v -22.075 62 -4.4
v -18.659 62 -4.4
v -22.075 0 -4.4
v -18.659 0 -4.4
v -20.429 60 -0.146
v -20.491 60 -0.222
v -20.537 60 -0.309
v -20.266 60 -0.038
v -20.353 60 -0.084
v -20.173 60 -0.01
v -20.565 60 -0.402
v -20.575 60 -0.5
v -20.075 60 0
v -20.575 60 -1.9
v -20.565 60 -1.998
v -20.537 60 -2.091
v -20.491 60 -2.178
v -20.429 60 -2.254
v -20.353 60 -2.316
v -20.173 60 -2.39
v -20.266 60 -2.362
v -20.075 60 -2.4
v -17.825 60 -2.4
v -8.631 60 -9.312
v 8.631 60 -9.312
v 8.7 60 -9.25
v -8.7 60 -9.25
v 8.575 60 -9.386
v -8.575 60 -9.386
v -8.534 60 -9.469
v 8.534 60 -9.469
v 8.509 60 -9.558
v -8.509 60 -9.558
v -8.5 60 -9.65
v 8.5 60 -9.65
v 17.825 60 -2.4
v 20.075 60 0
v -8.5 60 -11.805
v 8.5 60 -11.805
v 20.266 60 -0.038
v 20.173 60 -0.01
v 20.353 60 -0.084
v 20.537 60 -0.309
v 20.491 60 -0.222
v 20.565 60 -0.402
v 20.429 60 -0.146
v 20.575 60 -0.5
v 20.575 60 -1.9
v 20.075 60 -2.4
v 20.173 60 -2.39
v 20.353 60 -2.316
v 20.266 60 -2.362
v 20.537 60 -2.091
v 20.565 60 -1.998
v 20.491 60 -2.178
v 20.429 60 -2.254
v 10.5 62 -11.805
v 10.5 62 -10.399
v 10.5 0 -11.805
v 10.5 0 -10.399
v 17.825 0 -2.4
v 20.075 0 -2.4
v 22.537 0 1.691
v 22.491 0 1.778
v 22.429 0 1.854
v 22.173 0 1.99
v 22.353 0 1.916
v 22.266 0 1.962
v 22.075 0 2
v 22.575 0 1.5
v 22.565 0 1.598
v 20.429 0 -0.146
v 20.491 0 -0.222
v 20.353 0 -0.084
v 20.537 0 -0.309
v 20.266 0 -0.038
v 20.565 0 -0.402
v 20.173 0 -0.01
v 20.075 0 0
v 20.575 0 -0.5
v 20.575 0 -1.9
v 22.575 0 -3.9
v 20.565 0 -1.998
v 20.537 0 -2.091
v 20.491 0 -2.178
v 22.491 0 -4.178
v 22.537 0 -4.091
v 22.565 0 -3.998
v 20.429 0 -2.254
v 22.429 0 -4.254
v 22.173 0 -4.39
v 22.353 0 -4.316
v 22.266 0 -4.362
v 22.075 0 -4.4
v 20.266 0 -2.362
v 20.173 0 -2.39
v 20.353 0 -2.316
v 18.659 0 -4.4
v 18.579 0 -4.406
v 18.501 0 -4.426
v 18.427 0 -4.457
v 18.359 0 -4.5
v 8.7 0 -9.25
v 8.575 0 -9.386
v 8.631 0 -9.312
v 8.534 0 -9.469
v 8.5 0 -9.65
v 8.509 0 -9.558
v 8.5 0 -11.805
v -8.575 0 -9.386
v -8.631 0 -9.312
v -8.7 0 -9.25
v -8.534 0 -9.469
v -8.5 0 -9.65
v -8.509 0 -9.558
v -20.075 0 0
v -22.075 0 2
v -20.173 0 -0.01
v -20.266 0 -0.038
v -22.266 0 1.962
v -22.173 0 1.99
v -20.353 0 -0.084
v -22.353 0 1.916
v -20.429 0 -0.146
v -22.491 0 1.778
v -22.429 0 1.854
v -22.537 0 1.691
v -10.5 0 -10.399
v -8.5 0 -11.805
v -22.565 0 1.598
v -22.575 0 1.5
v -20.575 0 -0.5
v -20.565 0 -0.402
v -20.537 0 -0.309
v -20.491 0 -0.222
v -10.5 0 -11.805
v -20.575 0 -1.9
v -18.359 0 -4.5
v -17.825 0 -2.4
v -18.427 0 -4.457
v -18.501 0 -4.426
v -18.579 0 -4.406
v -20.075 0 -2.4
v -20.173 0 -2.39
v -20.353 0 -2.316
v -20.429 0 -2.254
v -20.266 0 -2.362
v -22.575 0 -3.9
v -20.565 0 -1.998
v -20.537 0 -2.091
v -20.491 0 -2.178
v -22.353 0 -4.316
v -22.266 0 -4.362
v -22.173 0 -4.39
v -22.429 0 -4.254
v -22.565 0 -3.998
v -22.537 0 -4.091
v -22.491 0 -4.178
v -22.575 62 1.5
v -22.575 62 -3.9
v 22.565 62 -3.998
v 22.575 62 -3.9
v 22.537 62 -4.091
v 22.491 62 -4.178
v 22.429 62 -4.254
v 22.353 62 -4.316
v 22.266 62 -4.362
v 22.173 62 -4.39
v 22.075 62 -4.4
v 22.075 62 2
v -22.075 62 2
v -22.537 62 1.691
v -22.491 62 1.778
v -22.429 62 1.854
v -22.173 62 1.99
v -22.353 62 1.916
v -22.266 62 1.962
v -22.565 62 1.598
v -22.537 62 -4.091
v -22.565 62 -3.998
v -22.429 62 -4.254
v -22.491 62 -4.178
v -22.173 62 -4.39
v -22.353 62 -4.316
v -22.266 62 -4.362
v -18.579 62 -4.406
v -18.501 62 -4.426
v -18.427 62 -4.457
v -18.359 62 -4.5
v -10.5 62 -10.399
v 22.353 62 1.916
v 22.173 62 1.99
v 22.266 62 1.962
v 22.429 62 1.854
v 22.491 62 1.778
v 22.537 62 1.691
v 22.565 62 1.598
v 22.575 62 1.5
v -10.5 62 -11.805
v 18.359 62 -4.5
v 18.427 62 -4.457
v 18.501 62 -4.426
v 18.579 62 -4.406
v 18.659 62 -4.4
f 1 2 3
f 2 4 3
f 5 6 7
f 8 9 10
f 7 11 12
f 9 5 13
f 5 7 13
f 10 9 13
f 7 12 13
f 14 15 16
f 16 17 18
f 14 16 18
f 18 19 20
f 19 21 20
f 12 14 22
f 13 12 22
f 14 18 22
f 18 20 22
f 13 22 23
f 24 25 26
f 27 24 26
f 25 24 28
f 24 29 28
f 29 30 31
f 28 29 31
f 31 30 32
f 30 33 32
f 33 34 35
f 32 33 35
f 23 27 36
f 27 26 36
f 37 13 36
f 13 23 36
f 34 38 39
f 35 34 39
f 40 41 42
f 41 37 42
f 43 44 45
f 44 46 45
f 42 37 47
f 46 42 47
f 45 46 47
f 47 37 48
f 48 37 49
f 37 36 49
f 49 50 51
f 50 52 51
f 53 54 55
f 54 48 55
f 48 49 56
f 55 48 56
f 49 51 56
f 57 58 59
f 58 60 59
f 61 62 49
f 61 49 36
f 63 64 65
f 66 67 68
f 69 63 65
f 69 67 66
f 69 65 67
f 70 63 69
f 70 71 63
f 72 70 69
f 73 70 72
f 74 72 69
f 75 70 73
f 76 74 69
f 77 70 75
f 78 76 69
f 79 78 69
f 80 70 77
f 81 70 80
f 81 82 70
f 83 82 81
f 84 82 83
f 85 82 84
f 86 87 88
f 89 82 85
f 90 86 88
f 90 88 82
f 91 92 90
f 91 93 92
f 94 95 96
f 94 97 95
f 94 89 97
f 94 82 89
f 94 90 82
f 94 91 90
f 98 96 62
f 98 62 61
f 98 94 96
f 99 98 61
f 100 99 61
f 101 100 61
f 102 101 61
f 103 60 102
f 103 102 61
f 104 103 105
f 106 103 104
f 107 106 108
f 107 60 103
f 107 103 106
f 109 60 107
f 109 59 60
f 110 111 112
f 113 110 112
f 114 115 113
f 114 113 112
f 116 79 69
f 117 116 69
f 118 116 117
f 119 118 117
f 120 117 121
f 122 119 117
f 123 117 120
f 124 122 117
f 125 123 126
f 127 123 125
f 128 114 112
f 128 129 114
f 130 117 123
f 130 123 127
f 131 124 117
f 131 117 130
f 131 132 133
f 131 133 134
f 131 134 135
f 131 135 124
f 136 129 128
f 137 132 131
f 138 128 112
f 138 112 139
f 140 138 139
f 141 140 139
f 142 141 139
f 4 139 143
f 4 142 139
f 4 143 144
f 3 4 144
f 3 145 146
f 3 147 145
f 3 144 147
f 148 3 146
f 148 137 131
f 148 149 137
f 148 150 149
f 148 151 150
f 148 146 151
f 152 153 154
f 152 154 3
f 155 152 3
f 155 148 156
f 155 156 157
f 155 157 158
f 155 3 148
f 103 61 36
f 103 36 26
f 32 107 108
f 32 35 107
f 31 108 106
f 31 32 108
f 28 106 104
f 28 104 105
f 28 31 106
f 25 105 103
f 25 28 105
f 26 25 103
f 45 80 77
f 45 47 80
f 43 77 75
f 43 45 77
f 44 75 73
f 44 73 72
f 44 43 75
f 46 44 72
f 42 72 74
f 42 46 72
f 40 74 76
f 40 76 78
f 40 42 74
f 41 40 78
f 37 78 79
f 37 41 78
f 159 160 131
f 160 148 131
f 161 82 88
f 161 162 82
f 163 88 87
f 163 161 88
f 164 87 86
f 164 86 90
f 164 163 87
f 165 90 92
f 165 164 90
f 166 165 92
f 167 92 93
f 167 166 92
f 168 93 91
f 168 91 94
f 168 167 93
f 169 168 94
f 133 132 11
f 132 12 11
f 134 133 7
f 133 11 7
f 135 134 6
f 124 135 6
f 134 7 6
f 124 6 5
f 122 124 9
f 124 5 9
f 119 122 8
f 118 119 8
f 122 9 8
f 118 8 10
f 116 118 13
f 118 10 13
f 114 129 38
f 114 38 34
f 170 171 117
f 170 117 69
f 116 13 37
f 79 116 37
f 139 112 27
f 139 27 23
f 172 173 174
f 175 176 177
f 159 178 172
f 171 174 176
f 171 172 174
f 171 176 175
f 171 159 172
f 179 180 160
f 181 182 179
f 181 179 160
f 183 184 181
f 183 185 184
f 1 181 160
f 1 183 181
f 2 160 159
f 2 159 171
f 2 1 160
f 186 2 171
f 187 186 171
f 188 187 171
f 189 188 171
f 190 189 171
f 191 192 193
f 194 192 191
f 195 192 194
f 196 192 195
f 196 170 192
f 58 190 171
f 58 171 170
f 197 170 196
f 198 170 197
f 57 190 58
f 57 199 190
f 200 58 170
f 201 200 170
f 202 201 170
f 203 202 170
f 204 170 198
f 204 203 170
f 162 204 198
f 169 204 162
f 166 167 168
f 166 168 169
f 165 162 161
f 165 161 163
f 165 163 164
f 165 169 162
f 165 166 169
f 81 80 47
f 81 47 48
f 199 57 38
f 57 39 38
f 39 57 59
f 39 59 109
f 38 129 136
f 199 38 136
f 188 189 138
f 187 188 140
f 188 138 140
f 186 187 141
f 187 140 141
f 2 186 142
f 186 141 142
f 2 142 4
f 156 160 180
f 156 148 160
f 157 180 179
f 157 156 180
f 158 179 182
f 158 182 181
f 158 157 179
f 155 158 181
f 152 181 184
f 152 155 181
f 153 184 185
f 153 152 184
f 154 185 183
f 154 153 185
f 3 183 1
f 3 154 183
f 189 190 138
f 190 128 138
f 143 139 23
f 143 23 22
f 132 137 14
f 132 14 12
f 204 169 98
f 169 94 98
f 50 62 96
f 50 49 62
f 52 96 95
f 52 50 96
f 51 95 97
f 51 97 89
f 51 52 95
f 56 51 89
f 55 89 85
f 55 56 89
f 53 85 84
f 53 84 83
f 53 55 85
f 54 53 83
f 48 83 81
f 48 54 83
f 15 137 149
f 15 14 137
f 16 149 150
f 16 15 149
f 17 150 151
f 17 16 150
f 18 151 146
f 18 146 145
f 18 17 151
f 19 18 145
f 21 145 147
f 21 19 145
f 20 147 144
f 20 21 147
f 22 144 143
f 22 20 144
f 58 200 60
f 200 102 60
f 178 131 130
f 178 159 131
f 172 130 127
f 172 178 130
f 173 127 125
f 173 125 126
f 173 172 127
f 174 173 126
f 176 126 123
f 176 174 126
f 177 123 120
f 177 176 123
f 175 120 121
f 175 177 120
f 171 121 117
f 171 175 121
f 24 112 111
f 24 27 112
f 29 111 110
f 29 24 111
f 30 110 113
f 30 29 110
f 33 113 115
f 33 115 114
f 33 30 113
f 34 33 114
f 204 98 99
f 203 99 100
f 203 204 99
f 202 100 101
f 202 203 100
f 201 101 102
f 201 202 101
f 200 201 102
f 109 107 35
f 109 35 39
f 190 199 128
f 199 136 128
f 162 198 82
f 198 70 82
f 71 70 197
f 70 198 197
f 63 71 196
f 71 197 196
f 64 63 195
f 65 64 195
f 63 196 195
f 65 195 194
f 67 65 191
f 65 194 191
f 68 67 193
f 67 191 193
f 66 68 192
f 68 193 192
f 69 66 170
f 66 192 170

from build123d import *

# Parameters (mm, degrees)
BOSS_EXTRUDE1_DEPTH = 60
BOSS_EXTRUDE2_DEPTH = 2
FILLET1_R           = 0.5


with BuildPart() as part:
    # Sketch2 → Boss-Extrude1 (new body)
    with BuildSketch(Plane(origin=(0, 0, 0), x_dir=(1, 0, 0), z_dir=(0, 1, 0))):
        Polygon((-20.575, 0), (20.575, 0), (20.575, 2.4), (17.825, 2.4), (8.5, 9.4), (8.5, 11.805044241), (10.5, 11.805044241), (10.5, 10.399464037), (18.492143163, 4.4), (22.575, 4.4), (22.575, -2), (-22.575, -2), (-22.575, 4.4), (-18.492143163, 4.4), (-10.5, 10.399464037), (-10.5, 11.805044241), (-8.5, 11.805044241), (-8.5, 9.4), (-17.825, 2.4), (-20.575, 2.4), align=None)
    extrude(amount=BOSS_EXTRUDE1_DEPTH)

    # Sketch4 → Boss-Extrude2 (add)
    with BuildSketch(Plane(origin=(0, 60, 0), x_dir=(1, 0, 0), z_dir=(0, 1, 0))):
        Polygon((-22.575, 4.4), (-22.575, -2), (22.575, -2), (22.575, 4.4), (18.492143163, 4.4), (10.5, 10.399464037), (10.5, 11.805044241), (-10.5, 11.805044241), (-10.5, 10.399464037), (-18.492143163, 4.4), align=None)
    extrude(amount=BOSS_EXTRUDE2_DEPTH)

    # Fillet1
    fillet1_edges = [part.edges().sort_by_distance(p)[0] for p in [
        (8.5, 30, -9.4),
        (18.492143163, 31, -4.4),
        (22.575, 31, -4.4),
        (22.575, 31, 2),
        (-22.575, 31, 2),
        (-22.575, 31, -4.4),
        (-18.492143163, 31, -4.4),
        (-8.5, 30, -9.4),
        (-20.575, 30, -2.4),
        (-20.575, 30, 0),
        (20.575, 30, 0),
        (20.575, 30, -2.4),
    ]]
    fillet(fillet1_edges, radius=FILLET1_R)


solid = part.part
